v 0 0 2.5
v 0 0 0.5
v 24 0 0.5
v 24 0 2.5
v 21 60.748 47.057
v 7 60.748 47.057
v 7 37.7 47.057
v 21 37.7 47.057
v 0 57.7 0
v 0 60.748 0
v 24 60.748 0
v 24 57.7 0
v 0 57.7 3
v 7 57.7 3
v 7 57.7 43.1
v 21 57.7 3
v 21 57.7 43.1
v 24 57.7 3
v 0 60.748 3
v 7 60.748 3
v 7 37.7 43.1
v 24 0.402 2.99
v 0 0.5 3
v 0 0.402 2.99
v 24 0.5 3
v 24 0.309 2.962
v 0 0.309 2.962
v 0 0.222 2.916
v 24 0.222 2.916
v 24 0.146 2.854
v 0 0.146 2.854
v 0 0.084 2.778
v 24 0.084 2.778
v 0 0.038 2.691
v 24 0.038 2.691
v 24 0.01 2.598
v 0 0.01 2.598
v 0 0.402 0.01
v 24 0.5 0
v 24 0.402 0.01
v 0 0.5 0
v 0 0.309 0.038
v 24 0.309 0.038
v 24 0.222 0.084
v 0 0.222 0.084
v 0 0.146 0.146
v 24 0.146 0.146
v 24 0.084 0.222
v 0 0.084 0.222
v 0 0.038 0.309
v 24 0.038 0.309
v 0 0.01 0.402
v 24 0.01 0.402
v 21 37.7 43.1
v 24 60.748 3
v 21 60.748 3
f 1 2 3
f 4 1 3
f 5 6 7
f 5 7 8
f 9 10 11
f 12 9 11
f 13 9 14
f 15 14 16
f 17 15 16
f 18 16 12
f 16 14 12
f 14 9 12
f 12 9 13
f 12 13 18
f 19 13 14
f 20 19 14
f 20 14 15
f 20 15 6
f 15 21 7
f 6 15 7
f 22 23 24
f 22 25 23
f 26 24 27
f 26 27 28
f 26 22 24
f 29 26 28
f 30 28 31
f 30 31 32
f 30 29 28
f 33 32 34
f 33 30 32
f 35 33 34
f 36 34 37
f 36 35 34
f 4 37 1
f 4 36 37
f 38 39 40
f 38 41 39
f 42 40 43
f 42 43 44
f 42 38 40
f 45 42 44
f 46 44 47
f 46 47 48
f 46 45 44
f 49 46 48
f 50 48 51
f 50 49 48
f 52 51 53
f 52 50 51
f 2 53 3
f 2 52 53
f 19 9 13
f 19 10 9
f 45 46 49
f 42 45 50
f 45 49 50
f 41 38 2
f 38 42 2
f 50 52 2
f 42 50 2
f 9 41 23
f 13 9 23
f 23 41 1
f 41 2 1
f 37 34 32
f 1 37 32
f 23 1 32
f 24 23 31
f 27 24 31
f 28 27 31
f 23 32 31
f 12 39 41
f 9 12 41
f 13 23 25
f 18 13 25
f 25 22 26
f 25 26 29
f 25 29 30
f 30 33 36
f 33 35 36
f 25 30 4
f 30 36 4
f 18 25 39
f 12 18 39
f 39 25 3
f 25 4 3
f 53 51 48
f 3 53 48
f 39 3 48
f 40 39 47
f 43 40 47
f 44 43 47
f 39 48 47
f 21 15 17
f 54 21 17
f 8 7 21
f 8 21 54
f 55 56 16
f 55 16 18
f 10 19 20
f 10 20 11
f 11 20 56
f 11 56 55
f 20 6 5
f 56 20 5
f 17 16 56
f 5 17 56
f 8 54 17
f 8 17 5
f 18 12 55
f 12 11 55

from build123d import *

# Parameters (mm, degrees)
EXTRUDE_1_DEPTH      = 57.7
EXTRUDE_2_DEPTH      = 40.1
EXTRUDE_2_DEPTH_BACK = 3
SKETCH_2_W           = 24
SKETCH_2_H           = 3.048049907
EXTRUDE_4_DEPTH      = 20
EXTRUDE_4_DEPTH_BACK = 3.04805
SKETCH_3_W           = 24
SKETCH_3_H           = 3.957309811
SKETCH_4_W           = 7
SKETCH_4_H           = 44.057309811
CUT_EXTRUDE_1_DEPTH  = 51
SKETCH_5_W           = 3
SKETCH_5_H           = 44.057309811
CUT_EXTRUDE_2_DEPTH  = 51
FILLET_1_R           = 0.5


with BuildPart() as part:
    # 草图1 → 凸台-拉伸1 (new body)
    with BuildSketch(Plane(origin=(0, 0, 0), x_dir=(1, 0, 0), z_dir=(0, 1, 0))):
        Polygon((3.532298037, 0), (0, 0), (0, -3), (24, -3), (24, 0), align=None)
    extrude(amount=EXTRUDE_1_DEPTH)

    # 圆角1
    fillet_1_edges = [part.edges().sort_by_distance(p)[0] for p in [
        (12, 0, 3),
        (12, 0, 0),
    ]]
    fillet(fillet_1_edges, radius=FILLET_1_R)


with BuildPart() as body_2:
    # 草图2 → 凸台-拉伸2 (new, two sides: drawn at the far end of the back side and taken through both)
    with BuildSketch(Plane.XY.offset(3).offset(-EXTRUDE_2_DEPTH_BACK)):
        with Locations((12, 59.224024954)):
            Rectangle(SKETCH_2_W, SKETCH_2_H)
    extrude(amount=EXTRUDE_2_DEPTH + EXTRUDE_2_DEPTH_BACK)

    # 草图3 → 凸台-拉伸4 (add, two sides: drawn at the far end of the back side and taken through both)
    with BuildSketch(Plane.XZ.offset(-57.7).offset(-EXTRUDE_4_DEPTH_BACK)):
        with Locations((12, 45.078654906)):
            Rectangle(SKETCH_3_W, SKETCH_3_H)
    extrude(amount=EXTRUDE_4_DEPTH + EXTRUDE_4_DEPTH_BACK)

    # 草图4 → 切除-拉伸1 (cut)
    with BuildSketch(Plane.XZ.offset(-37.7)):
        with Locations((3.5, 25.028654906)):
            Rectangle(SKETCH_4_W, SKETCH_4_H)
    extrude(amount=-CUT_EXTRUDE_1_DEPTH, mode=Mode.SUBTRACT)

    # 草图5 → 切除-拉伸2 (cut)
    with BuildSketch(Plane.XZ.offset(-37.7)):
        with Locations((22.5, 25.028654906)):
            Rectangle(SKETCH_5_W, SKETCH_5_H)
    extrude(amount=-CUT_EXTRUDE_2_DEPTH, mode=Mode.SUBTRACT)


solid = Compound([part.part, body_2.part])
